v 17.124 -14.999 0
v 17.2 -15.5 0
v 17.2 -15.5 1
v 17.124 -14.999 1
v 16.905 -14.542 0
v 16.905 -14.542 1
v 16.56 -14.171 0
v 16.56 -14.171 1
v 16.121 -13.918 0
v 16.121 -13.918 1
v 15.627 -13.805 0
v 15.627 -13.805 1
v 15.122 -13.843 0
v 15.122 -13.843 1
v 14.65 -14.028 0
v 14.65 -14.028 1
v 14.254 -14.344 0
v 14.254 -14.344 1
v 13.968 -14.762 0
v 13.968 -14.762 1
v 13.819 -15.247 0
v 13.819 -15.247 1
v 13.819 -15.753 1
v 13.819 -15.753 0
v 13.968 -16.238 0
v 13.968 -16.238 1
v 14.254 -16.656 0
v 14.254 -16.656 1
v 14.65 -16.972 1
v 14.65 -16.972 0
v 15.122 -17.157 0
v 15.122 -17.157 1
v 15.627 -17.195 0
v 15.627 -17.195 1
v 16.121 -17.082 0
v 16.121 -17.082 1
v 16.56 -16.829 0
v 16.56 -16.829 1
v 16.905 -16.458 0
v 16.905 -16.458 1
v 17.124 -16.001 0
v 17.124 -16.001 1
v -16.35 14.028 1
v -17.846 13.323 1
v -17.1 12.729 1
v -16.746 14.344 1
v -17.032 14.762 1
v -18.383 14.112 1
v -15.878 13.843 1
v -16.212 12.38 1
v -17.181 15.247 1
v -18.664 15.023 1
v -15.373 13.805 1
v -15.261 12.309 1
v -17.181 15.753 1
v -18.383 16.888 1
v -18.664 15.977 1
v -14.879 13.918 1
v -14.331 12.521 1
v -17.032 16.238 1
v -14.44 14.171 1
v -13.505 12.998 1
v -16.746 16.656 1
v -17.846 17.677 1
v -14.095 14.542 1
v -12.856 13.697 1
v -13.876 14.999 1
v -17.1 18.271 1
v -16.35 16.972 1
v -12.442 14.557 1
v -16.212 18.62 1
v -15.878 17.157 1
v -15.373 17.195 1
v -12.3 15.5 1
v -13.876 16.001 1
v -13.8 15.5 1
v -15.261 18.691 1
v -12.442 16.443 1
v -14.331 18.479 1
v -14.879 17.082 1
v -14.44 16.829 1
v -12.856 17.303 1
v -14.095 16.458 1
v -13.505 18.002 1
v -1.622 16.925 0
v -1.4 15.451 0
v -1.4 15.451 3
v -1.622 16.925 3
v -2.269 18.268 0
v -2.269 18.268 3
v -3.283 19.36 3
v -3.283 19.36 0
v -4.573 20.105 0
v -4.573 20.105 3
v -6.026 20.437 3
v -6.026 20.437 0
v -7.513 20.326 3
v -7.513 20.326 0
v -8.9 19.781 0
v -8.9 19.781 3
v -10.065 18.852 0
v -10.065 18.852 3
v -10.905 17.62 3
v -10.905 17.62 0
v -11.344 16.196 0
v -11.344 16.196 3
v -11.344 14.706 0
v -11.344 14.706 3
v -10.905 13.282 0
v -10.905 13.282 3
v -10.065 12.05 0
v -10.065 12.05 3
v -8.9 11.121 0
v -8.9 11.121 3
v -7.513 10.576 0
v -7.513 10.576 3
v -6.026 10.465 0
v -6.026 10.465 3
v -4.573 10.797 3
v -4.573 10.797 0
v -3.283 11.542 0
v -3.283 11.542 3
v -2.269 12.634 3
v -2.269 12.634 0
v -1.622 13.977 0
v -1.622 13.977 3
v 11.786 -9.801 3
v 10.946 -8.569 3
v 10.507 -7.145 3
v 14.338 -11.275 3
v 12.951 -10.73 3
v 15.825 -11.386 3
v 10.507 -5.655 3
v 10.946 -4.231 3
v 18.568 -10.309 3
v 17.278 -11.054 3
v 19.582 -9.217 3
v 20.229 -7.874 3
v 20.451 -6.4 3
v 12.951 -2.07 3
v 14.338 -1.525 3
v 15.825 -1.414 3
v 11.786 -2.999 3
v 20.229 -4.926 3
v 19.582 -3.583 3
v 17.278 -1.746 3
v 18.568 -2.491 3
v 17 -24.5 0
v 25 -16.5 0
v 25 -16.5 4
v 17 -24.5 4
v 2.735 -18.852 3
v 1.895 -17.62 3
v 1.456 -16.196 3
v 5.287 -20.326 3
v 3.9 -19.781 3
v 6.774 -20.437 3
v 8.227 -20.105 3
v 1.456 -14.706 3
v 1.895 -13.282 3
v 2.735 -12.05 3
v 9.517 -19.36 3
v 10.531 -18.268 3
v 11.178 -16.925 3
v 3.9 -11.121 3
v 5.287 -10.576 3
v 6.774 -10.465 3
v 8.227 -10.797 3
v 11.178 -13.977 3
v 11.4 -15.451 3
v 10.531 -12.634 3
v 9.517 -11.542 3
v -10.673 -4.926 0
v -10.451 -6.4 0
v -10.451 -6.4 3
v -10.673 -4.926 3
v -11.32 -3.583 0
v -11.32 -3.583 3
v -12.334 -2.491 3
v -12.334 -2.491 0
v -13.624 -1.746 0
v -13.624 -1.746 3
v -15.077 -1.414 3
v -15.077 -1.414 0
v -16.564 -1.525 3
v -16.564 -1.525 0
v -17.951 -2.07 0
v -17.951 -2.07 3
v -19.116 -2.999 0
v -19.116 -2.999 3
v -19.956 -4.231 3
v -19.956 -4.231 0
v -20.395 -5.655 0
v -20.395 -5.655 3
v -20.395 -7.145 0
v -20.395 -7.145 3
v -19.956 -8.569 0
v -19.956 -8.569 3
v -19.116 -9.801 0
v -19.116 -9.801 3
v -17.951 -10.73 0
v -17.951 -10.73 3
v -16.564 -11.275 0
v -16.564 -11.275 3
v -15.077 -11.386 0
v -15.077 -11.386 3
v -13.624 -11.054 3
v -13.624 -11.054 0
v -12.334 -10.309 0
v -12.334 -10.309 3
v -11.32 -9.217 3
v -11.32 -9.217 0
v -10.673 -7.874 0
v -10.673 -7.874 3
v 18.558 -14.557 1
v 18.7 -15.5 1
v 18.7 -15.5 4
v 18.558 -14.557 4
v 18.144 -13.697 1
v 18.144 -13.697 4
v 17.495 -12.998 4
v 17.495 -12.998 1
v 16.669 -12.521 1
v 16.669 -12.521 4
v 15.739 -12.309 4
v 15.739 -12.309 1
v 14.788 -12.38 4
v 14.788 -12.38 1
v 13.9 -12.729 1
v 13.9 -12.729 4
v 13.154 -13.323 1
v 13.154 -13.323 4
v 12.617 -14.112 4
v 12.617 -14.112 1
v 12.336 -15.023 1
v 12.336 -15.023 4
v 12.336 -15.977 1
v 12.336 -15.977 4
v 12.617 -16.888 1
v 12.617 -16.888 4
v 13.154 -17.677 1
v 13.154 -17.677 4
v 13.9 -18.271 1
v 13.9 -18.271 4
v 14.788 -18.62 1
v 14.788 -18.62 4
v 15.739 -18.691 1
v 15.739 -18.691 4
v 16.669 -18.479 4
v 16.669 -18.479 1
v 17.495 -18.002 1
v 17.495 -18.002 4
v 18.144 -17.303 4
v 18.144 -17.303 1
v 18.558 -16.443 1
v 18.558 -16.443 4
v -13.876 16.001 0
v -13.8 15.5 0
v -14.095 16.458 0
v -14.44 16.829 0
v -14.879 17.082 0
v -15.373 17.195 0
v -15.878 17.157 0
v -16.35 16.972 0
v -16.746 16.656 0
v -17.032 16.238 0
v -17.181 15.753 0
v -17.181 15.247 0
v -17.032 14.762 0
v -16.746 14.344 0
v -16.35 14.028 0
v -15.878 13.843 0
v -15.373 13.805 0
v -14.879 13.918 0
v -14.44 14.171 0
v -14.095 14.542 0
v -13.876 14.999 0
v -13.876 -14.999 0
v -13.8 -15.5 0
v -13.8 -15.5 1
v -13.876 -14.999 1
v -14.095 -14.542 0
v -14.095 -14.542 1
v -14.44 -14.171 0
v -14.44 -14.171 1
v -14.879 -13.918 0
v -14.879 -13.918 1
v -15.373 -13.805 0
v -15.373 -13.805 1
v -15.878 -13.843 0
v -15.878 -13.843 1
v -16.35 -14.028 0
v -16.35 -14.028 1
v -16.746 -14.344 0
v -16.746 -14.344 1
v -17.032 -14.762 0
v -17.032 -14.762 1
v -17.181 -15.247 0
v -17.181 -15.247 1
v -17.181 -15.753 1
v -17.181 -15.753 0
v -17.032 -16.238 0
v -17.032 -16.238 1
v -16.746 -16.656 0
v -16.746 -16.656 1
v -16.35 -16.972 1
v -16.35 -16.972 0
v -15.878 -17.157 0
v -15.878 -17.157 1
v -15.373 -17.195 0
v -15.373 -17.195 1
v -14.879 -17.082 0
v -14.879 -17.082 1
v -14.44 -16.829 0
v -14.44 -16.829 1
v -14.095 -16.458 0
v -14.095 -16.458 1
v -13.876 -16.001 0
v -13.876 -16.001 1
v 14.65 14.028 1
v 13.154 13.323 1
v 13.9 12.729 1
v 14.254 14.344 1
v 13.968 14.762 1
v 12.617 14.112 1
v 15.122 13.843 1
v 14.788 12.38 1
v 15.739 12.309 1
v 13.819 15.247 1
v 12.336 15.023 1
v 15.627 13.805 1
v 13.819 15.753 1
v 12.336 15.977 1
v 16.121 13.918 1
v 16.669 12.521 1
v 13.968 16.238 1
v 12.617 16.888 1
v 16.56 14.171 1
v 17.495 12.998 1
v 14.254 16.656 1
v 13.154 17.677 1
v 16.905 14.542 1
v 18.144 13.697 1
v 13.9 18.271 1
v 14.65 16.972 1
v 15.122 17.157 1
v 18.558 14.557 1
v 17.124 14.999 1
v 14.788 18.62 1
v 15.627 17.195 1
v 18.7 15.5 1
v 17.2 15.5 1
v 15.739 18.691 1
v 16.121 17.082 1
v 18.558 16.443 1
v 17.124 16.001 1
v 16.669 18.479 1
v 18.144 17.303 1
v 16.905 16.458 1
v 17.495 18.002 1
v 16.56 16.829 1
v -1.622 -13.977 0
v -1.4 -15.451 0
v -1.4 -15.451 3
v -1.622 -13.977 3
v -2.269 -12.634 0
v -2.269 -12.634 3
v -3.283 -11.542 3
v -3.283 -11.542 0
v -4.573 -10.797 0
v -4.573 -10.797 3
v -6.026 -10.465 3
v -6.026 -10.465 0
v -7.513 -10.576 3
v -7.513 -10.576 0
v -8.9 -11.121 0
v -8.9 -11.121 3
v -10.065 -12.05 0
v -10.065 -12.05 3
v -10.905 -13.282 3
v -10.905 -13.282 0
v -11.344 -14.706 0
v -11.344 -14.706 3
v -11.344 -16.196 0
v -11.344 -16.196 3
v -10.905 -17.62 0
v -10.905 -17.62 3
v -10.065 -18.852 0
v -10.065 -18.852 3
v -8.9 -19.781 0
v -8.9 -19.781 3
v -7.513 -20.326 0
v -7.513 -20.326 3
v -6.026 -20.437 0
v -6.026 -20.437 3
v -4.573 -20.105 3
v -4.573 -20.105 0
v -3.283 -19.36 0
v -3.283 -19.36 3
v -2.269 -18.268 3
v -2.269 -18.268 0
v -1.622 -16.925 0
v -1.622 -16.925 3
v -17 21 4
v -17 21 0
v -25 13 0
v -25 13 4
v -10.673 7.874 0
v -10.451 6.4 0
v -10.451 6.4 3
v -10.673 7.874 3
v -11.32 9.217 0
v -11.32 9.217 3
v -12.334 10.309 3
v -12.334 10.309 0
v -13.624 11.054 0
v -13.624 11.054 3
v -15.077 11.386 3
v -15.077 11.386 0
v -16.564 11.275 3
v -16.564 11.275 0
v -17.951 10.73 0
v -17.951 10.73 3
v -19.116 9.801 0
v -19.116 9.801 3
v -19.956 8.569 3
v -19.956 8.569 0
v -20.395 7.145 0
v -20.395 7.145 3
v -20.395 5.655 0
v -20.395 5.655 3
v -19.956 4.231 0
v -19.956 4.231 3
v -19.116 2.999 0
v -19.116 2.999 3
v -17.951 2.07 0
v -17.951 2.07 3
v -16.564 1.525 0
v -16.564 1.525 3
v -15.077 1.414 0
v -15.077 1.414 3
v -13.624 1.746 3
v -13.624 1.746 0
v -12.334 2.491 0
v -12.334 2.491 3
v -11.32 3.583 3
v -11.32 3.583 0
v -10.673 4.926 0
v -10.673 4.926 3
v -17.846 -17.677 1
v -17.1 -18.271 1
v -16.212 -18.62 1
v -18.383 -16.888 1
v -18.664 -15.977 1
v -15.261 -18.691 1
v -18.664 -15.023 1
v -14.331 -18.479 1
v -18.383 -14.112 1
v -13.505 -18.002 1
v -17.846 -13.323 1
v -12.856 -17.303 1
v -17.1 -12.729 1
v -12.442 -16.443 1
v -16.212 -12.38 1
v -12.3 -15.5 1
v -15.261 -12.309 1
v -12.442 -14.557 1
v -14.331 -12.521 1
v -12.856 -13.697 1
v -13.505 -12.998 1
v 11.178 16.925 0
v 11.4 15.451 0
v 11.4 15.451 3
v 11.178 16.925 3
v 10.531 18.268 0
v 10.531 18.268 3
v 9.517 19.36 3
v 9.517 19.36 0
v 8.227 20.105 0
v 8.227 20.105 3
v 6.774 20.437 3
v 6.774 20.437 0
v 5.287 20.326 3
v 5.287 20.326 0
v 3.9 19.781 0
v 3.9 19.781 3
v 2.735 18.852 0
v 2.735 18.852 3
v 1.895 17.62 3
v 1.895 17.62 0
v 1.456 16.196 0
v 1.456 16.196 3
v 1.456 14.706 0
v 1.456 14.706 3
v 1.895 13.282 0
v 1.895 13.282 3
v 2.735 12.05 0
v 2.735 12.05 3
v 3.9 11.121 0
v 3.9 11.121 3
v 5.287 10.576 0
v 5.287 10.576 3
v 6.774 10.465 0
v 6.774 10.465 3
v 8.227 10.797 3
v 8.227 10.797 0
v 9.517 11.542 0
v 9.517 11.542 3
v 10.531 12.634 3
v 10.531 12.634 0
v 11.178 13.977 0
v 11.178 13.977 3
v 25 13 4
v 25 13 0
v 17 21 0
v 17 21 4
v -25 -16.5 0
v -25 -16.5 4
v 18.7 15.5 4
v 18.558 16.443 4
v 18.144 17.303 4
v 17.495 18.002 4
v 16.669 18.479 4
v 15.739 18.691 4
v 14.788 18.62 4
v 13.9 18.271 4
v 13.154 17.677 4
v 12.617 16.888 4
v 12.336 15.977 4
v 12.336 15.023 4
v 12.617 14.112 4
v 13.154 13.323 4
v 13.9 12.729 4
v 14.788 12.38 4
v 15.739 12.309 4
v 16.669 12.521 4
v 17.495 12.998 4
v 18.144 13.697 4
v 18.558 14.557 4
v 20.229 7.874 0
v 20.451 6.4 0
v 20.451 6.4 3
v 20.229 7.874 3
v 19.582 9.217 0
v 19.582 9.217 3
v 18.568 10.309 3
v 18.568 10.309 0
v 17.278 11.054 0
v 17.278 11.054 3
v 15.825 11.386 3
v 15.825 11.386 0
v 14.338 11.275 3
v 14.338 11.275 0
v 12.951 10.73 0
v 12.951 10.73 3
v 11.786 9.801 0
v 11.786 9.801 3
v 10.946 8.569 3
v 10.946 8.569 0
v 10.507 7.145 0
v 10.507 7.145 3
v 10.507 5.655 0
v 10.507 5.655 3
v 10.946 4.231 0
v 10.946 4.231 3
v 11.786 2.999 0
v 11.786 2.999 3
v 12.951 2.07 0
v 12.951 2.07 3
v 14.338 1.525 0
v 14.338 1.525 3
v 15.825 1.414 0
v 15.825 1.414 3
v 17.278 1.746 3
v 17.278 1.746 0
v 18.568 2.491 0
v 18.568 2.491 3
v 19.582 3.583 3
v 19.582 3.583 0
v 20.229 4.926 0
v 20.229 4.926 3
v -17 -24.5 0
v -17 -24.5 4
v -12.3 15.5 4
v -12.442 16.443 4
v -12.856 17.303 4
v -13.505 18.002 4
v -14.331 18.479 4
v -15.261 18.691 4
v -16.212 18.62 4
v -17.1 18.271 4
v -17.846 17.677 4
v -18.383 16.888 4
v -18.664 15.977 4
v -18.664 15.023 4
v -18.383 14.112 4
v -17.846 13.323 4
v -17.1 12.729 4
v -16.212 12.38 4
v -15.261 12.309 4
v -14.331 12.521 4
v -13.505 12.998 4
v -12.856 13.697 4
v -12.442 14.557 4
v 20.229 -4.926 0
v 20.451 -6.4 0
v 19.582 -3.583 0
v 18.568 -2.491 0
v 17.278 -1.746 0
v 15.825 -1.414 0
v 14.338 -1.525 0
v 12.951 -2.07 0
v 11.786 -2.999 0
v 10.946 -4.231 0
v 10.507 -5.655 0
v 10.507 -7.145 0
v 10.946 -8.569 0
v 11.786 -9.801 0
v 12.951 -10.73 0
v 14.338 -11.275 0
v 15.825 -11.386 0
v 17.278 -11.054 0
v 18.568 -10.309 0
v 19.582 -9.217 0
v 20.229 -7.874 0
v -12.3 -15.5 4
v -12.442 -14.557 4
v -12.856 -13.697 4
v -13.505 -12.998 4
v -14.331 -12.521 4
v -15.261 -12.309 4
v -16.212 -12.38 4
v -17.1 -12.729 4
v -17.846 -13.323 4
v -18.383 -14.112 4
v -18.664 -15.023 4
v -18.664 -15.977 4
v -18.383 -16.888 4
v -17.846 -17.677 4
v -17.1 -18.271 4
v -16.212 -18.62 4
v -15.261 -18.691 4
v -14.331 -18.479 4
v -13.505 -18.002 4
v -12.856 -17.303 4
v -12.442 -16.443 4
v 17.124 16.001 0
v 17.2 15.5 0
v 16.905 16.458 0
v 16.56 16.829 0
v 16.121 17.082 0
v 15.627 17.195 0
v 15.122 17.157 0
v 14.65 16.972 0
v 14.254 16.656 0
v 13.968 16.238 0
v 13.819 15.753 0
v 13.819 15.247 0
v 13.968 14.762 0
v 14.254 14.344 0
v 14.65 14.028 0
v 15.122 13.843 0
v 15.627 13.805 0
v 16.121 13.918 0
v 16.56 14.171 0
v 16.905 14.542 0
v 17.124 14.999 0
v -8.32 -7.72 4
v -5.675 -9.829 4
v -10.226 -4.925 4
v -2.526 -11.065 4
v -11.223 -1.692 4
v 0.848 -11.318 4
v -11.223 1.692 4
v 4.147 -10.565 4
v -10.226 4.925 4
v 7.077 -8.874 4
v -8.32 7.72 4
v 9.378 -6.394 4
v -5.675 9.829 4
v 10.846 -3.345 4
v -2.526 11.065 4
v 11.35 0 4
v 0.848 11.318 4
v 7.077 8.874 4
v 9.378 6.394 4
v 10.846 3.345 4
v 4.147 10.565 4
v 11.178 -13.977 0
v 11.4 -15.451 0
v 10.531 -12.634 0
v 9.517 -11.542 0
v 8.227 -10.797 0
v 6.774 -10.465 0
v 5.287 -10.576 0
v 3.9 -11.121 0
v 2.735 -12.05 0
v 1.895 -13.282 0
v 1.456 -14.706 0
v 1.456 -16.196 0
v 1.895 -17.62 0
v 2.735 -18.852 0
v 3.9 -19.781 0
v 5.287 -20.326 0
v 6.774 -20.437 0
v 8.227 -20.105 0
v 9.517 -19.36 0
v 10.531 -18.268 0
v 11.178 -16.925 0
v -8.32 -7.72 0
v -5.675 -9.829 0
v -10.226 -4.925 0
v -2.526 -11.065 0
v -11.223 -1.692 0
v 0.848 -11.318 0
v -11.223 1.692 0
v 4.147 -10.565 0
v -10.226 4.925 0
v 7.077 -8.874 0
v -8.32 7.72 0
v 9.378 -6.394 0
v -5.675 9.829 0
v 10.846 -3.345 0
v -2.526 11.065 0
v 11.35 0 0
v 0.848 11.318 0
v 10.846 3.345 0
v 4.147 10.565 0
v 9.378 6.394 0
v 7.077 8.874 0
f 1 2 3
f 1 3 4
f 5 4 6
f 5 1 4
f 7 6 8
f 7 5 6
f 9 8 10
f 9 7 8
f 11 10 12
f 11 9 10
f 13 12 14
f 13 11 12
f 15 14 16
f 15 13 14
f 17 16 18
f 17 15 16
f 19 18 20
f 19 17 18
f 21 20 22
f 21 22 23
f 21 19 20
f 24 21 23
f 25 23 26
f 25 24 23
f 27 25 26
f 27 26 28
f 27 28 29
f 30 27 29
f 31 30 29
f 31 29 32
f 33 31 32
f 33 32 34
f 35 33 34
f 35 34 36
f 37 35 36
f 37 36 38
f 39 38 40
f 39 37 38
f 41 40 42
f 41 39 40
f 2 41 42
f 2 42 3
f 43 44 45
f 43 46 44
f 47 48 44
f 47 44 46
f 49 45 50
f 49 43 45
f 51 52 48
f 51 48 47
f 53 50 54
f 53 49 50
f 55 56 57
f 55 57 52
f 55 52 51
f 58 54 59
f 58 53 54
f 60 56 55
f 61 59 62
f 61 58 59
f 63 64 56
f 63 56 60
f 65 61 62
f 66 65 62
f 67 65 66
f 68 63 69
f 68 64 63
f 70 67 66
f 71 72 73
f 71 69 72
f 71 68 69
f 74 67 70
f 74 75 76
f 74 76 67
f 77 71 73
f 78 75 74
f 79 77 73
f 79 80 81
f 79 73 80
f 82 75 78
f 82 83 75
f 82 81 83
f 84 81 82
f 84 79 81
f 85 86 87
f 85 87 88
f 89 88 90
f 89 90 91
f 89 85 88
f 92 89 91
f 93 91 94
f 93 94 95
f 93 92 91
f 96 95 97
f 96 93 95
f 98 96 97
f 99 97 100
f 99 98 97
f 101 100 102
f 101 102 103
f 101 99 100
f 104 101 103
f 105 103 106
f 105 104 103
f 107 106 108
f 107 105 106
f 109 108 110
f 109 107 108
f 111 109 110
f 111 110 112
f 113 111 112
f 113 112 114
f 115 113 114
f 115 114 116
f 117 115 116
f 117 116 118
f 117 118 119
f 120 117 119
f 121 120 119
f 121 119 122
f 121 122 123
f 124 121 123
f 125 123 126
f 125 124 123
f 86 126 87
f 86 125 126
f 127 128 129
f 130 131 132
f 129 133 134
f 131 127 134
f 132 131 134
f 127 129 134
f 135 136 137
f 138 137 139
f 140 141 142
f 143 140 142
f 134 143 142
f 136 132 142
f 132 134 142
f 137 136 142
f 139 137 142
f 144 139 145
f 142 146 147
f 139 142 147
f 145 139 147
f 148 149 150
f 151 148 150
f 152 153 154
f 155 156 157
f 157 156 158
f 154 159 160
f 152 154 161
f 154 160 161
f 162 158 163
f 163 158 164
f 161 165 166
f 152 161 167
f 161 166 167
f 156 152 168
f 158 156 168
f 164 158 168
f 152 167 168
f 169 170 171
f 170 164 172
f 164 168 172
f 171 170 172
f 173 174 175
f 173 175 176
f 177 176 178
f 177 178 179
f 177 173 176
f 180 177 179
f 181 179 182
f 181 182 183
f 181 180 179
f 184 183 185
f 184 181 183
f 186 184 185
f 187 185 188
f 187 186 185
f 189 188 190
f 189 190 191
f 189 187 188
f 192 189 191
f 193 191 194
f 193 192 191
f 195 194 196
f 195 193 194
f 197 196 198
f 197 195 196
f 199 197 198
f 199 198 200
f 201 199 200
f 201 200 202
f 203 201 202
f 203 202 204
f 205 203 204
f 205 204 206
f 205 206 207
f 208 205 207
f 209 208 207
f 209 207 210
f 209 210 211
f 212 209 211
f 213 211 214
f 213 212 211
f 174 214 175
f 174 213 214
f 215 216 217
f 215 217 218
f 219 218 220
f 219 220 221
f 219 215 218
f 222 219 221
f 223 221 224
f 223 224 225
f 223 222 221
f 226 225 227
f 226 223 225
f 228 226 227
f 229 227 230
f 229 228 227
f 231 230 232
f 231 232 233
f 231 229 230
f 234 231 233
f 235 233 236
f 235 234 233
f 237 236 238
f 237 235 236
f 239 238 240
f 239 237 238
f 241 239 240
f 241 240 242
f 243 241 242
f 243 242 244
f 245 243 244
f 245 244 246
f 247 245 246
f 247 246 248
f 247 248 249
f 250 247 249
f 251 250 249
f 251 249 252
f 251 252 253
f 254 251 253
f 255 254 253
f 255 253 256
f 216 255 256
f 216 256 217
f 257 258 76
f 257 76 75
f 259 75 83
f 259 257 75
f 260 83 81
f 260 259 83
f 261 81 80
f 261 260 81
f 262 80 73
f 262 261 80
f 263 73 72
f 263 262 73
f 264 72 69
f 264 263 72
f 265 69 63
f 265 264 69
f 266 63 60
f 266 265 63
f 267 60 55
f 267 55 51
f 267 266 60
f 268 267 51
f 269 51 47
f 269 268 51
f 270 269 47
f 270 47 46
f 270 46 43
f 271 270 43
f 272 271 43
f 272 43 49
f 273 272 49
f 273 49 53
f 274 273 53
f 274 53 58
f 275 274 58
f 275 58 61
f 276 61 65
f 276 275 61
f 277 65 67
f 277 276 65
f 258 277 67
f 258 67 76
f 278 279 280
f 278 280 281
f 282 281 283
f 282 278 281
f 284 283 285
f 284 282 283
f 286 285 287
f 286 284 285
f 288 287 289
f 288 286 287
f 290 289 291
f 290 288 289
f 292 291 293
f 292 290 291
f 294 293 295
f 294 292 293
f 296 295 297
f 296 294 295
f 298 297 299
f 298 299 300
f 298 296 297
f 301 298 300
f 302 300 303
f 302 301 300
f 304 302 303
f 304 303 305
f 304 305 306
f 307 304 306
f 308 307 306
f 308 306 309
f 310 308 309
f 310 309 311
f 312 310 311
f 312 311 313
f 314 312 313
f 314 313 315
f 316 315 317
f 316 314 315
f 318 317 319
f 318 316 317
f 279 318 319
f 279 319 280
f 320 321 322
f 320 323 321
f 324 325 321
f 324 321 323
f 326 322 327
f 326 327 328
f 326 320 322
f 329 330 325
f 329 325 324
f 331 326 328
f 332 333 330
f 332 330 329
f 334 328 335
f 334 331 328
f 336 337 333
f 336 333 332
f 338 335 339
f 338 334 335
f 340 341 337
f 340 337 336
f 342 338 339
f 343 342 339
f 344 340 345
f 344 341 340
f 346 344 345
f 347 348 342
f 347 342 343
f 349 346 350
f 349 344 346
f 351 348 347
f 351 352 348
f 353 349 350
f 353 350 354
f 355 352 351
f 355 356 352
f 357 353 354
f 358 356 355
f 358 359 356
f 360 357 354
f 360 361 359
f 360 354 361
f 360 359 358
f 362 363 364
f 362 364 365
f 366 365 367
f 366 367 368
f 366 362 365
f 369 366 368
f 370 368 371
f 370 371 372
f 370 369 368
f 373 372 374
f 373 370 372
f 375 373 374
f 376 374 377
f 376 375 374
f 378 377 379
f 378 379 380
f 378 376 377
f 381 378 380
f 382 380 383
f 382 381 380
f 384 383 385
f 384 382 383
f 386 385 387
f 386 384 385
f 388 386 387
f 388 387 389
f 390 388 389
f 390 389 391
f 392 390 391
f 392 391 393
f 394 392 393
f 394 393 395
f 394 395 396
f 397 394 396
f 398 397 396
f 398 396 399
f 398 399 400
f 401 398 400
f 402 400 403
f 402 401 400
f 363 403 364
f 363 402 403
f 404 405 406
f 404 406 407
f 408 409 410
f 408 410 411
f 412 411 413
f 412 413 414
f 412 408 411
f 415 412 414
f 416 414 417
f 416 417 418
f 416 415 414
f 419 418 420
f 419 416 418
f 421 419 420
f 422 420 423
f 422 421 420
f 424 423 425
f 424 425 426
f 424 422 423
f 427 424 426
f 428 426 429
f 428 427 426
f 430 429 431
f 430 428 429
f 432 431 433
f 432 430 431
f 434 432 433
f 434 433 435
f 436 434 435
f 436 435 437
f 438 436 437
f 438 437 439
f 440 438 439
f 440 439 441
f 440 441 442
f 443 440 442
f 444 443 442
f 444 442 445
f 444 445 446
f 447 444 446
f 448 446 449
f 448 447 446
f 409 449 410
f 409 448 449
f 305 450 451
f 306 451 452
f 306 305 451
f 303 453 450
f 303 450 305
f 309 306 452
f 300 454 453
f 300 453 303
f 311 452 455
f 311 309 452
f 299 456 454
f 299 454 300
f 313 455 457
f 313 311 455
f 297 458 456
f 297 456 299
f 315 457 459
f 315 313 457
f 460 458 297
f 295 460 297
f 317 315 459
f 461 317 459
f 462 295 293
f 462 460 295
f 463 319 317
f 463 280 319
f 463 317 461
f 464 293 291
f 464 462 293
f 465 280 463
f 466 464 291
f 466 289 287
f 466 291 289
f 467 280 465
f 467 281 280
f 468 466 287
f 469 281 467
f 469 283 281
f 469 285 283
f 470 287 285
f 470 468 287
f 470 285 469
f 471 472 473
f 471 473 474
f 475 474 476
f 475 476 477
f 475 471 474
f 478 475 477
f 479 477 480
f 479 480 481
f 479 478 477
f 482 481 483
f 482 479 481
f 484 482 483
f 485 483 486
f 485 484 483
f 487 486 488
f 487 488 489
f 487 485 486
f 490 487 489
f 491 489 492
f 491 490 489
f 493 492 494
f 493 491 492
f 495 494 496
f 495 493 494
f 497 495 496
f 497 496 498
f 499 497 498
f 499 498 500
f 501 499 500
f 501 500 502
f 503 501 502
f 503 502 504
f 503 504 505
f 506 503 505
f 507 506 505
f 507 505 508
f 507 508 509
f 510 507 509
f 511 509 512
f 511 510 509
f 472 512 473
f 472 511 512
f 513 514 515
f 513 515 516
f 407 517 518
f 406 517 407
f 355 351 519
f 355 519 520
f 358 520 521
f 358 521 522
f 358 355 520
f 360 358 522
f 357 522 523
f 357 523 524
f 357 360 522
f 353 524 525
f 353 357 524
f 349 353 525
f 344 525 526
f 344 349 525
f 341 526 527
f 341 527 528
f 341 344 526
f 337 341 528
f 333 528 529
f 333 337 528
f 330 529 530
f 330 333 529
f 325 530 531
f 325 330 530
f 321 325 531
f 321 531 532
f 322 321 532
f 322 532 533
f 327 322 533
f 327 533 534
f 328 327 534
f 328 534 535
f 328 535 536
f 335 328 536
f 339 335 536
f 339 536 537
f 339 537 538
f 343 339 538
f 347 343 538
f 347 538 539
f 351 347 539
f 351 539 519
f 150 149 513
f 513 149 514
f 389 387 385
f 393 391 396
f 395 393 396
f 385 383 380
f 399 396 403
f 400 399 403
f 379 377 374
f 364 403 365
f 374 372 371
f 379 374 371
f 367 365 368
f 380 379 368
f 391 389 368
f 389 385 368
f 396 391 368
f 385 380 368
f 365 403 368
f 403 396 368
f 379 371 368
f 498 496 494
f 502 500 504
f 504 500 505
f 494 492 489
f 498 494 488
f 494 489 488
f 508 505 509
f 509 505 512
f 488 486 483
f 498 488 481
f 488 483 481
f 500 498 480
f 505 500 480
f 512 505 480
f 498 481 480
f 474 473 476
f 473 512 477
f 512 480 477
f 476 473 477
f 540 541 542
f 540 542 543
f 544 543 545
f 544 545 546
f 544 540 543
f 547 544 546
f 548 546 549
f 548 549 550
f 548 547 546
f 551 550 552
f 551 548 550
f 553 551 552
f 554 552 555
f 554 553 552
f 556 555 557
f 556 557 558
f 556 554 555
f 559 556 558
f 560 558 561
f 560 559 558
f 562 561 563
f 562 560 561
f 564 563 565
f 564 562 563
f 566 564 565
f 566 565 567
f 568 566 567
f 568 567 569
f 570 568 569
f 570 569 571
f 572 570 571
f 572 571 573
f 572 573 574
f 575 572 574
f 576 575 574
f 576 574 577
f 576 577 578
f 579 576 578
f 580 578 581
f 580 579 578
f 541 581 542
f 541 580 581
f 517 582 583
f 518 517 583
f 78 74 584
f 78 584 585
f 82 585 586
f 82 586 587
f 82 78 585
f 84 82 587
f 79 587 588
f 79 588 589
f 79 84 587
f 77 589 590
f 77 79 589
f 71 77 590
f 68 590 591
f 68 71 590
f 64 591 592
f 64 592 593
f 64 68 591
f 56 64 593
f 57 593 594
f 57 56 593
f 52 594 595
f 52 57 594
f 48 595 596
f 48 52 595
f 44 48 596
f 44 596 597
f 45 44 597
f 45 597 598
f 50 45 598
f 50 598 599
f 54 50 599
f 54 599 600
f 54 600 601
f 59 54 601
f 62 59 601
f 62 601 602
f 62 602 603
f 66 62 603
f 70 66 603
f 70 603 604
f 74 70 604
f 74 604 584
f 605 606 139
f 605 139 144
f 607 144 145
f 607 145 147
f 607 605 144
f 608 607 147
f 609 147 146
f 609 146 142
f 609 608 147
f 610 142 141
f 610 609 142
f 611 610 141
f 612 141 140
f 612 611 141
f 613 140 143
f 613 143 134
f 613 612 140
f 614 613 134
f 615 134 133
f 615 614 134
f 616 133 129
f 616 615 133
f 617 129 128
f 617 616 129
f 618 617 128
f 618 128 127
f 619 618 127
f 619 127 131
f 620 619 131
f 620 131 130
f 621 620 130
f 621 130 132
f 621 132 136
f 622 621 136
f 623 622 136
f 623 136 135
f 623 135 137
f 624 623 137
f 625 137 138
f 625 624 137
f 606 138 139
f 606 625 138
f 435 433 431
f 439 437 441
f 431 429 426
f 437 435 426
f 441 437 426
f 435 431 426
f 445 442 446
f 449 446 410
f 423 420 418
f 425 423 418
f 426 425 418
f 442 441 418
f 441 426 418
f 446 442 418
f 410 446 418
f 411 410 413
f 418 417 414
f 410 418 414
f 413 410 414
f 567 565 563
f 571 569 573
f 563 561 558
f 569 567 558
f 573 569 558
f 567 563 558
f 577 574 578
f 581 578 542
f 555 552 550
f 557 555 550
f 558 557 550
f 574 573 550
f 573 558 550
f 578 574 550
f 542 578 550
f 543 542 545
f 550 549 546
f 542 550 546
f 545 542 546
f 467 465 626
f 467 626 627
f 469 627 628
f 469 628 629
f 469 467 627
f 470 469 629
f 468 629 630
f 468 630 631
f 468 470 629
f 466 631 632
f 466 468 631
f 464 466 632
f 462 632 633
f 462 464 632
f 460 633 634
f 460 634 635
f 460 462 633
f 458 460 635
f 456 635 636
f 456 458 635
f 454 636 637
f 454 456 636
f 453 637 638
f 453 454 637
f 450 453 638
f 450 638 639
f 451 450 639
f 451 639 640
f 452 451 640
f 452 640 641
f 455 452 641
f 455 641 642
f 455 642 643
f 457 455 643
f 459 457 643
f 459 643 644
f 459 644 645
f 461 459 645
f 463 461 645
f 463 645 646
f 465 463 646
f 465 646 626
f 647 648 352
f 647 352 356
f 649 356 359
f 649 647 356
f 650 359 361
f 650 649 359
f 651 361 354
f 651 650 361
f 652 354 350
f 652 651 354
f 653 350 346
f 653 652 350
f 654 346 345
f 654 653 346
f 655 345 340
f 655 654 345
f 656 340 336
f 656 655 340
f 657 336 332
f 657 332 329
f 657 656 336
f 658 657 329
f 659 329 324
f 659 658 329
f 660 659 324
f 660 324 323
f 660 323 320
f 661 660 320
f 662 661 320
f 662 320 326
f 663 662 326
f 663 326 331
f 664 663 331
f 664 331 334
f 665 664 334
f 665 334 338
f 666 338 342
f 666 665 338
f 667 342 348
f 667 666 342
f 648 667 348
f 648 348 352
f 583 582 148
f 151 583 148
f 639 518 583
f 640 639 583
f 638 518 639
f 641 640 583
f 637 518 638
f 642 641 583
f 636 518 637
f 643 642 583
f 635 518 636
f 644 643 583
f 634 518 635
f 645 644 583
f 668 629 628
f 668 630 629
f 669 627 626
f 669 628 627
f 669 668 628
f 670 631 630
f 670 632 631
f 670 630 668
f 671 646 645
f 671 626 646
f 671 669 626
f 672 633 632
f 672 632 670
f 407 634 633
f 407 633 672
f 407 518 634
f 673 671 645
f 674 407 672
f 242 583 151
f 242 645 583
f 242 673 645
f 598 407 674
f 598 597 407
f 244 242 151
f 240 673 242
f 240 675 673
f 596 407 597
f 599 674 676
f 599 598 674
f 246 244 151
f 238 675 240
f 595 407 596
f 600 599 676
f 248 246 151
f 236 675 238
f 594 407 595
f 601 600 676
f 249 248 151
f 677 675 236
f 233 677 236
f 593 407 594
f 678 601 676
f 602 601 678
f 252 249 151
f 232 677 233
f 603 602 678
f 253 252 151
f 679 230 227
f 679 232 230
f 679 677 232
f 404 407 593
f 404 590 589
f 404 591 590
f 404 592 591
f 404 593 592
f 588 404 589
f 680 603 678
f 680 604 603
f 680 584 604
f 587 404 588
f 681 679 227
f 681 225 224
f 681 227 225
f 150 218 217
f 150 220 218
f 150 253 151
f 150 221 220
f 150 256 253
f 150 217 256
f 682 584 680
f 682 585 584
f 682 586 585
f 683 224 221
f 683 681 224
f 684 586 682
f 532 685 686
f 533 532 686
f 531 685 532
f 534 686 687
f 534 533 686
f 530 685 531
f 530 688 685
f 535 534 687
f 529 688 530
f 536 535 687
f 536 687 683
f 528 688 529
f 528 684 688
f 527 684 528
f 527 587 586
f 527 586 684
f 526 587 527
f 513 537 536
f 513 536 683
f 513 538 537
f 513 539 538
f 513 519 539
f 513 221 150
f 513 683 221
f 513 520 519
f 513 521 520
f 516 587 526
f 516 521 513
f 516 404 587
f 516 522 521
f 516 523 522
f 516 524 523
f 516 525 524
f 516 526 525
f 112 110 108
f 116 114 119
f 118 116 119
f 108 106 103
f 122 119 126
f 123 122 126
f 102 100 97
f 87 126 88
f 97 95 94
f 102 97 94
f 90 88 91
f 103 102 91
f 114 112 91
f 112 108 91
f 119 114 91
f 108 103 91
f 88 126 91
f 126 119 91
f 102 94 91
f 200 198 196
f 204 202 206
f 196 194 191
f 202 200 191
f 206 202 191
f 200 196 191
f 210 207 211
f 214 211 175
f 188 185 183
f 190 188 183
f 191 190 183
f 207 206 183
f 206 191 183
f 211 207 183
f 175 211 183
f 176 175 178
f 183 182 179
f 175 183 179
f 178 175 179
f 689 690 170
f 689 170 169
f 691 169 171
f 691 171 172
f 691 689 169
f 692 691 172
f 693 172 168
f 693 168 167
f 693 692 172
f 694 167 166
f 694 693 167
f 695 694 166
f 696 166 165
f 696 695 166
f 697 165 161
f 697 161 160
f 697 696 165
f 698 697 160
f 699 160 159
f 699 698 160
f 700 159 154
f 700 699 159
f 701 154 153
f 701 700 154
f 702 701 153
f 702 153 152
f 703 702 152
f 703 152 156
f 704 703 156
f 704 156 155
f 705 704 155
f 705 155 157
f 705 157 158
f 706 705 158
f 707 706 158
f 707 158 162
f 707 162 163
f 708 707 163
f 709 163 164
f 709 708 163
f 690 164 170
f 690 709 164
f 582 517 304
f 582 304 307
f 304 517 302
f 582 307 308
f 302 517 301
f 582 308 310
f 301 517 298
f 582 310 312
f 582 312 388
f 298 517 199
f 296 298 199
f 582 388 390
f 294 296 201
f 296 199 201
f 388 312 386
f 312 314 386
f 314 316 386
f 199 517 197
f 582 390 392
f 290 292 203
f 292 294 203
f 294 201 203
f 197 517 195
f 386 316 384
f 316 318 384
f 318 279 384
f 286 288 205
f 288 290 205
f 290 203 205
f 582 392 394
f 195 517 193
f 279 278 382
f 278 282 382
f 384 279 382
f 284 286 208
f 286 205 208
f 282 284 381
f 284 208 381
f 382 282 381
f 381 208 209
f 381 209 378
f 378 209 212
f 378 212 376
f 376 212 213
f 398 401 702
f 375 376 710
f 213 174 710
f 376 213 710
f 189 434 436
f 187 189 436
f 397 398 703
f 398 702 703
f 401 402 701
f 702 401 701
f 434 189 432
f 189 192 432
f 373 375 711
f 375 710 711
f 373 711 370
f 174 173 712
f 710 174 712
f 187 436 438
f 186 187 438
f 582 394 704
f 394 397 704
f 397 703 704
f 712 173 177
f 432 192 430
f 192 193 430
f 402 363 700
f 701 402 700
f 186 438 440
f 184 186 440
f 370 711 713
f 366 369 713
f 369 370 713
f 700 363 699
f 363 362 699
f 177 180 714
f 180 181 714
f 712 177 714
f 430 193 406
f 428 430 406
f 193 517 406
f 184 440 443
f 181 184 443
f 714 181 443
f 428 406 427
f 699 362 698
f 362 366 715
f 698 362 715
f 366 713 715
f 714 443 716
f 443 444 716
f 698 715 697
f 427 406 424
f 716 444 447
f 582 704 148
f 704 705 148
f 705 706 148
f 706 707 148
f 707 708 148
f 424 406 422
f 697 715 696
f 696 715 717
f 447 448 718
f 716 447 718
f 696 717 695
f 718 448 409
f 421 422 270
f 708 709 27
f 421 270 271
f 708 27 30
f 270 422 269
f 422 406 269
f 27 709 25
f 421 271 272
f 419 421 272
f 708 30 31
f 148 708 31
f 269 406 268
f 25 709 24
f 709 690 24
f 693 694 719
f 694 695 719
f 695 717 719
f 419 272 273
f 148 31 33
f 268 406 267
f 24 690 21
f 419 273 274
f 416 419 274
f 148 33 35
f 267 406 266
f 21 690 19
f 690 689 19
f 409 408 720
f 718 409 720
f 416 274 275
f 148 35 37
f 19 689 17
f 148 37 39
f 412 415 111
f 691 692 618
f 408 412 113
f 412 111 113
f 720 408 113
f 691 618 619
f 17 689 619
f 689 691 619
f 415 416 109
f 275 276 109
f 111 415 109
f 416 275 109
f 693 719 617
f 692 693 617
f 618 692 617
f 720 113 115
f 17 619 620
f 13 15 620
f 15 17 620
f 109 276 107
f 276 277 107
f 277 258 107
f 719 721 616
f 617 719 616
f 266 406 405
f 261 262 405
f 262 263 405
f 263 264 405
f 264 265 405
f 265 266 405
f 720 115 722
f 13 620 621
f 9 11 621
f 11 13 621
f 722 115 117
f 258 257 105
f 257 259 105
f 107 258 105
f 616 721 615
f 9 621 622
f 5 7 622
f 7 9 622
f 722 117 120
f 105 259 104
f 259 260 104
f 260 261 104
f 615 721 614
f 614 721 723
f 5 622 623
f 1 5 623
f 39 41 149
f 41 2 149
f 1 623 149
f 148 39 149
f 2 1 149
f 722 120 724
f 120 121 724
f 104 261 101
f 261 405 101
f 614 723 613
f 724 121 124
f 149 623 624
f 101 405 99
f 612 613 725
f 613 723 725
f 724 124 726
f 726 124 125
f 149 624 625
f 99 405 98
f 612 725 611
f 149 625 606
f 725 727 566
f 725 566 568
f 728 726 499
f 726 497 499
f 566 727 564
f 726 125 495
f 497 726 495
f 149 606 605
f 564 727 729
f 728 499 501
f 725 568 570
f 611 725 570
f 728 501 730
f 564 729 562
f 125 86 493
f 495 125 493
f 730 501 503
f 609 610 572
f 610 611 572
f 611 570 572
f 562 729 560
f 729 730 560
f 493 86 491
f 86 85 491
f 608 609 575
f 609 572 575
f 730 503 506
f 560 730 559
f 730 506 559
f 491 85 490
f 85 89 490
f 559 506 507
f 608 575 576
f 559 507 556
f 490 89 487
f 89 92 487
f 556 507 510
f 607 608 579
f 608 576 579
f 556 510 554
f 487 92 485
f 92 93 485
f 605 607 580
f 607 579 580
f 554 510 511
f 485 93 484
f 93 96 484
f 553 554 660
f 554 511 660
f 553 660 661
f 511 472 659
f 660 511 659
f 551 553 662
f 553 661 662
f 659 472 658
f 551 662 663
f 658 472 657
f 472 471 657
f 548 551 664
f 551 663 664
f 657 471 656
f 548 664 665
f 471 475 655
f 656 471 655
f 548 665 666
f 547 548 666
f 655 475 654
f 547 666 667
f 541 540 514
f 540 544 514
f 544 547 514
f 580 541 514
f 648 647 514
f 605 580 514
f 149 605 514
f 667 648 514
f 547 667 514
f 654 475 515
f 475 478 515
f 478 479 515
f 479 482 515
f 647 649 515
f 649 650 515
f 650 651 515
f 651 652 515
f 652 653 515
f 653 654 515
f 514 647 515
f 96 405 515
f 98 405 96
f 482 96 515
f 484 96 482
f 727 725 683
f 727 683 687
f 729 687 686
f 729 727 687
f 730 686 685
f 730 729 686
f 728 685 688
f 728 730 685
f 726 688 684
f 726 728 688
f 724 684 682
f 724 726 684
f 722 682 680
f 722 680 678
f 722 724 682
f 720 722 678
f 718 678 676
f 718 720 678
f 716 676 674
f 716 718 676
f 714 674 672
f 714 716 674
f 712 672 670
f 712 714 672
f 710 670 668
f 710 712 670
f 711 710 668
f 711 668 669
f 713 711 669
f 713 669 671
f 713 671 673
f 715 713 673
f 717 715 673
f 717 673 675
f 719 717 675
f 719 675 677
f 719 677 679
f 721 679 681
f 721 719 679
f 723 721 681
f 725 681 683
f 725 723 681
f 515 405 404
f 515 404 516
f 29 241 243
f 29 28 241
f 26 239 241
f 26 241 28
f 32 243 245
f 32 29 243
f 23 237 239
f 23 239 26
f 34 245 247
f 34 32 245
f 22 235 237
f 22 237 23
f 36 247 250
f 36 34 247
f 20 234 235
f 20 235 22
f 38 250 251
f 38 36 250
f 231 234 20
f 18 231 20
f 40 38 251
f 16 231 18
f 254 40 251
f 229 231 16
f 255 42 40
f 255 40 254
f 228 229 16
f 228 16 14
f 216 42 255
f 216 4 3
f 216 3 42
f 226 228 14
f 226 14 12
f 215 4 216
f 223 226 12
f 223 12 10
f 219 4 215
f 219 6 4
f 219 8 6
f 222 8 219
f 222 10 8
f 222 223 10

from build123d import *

# Parameters (mm, degrees)
F0_W     = 50
F0_H     = 45.5
F0_R     = 3.2
F0_R_2   = 5
F0_R_3   = 11.35
F1_DEPTH = 4
F0_R_4   = 1.7
F2_DEPTH = 1
F3_DEPTH = 3
F4_SIZE  = 8


# Not quite as in the source:
# - a feature names something its author has since deleted; it is built from what else it names


with BuildPart() as f1:
    # F0 (on Top) → F1 (new body)
    with BuildSketch(Plane.XY):
        with Locations((0, -1.75)):
            Rectangle(F0_W, F0_H)
        with Locations((-15.5, -15.5)):
            Circle(F0_R, mode=Mode.SUBTRACT)
        with Locations((-6.4, -15.4509711824)):
            Circle(F0_R_2, mode=Mode.SUBTRACT)
        with Locations((-15.4509711824, -6.4)):
            Circle(F0_R_2, mode=Mode.SUBTRACT)
        with Locations((6.4, -15.4509711824)):
            Circle(F0_R_2, mode=Mode.SUBTRACT)
        with Locations((15.5, -15.5)):
            Circle(F0_R, mode=Mode.SUBTRACT)
        with Locations((15.4509711824, -6.4)):
            Circle(F0_R_2, mode=Mode.SUBTRACT)
        with Locations((-15.4509711824, 6.4)):
            Circle(F0_R_2, mode=Mode.SUBTRACT)
        with Locations((-15.5, 15.5)):
            Circle(F0_R, mode=Mode.SUBTRACT)
        with Locations((-6.4, 15.4509711824)):
            Circle(F0_R_2, mode=Mode.SUBTRACT)
        Circle(F0_R_3, mode=Mode.SUBTRACT)
        with Locations((15.4509711824, 6.4)):
            Circle(F0_R_2, mode=Mode.SUBTRACT)
        with Locations((6.4, 15.4509711824)):
            Circle(F0_R_2, mode=Mode.SUBTRACT)
        with Locations((15.5, 15.5)):
            Circle(F0_R, mode=Mode.SUBTRACT)
        with Locations((-15.4509711824, -6.4)):
            Circle(F0_R_2)
        with Locations((-6.4, -15.4509711824)):
            Circle(F0_R_2)
        with Locations((6.4, -15.4509711824)):
            Circle(F0_R_2)
        with Locations((15.4509711824, -6.4)):
            Circle(F0_R_2)
        with Locations((15.4509711824, 6.4)):
            Circle(F0_R_2)
        with Locations((6.4, 15.4509711824)):
            Circle(F0_R_2)
        with Locations((-6.4, 15.4509711824)):
            Circle(F0_R_2)
        with Locations((-15.4509711824, 6.4)):
            Circle(F0_R_2)
    extrude(amount=F1_DEPTH)

    # F0 (on Top) → F2 (join)
    with BuildSketch(Plane.XY):
        with Locations((-15.5, 15.5)):
            Circle(F0_R)
        with Locations((-15.5, 15.5)):
            Circle(F0_R_4, mode=Mode.SUBTRACT)
        with Locations((15.5, 15.5)):
            Circle(F0_R)
        with Locations((15.5, 15.5)):
            Circle(F0_R_4, mode=Mode.SUBTRACT)
        with Locations((15.5, -15.5)):
            Circle(F0_R)
        with Locations((15.5, -15.5)):
            Circle(F0_R_4, mode=Mode.SUBTRACT)
        with Locations((-15.5, -15.5)):
            Circle(F0_R)
        with Locations((-15.5, -15.5)):
            Circle(F0_R_4, mode=Mode.SUBTRACT)
    extrude(amount=F2_DEPTH)

    # F0 (on Top) → F3 (cut)
    with BuildSketch(Plane.XY):
        with Locations((-15.4509711824, -6.4)):
            Circle(F0_R_2)
        with Locations((-6.4, -15.4509711824)):
            Circle(F0_R_2)
        with Locations((6.4, -15.4509711824)):
            Circle(F0_R_2)
        with Locations((15.4509711824, -6.4)):
            Circle(F0_R_2)
        with Locations((15.4509711824, 6.4)):
            Circle(F0_R_2)
        with Locations((6.4, 15.4509711824)):
            Circle(F0_R_2)
        with Locations((-6.4, 15.4509711824)):
            Circle(F0_R_2)
        with Locations((-15.4509711824, 6.4)):
            Circle(F0_R_2)
    extrude(amount=F3_DEPTH, mode=Mode.SUBTRACT)

    # F4
    f4_edges = [f1.edges().sort_by_distance(p)[0] for p in [
        (25, 21, 2),
        (-25, 21, 2),
        (25, -24.5, 2),
        (-25, -24.5, 2),
    ]]
    chamfer(f4_edges, length=F4_SIZE)


solid = f1.part
